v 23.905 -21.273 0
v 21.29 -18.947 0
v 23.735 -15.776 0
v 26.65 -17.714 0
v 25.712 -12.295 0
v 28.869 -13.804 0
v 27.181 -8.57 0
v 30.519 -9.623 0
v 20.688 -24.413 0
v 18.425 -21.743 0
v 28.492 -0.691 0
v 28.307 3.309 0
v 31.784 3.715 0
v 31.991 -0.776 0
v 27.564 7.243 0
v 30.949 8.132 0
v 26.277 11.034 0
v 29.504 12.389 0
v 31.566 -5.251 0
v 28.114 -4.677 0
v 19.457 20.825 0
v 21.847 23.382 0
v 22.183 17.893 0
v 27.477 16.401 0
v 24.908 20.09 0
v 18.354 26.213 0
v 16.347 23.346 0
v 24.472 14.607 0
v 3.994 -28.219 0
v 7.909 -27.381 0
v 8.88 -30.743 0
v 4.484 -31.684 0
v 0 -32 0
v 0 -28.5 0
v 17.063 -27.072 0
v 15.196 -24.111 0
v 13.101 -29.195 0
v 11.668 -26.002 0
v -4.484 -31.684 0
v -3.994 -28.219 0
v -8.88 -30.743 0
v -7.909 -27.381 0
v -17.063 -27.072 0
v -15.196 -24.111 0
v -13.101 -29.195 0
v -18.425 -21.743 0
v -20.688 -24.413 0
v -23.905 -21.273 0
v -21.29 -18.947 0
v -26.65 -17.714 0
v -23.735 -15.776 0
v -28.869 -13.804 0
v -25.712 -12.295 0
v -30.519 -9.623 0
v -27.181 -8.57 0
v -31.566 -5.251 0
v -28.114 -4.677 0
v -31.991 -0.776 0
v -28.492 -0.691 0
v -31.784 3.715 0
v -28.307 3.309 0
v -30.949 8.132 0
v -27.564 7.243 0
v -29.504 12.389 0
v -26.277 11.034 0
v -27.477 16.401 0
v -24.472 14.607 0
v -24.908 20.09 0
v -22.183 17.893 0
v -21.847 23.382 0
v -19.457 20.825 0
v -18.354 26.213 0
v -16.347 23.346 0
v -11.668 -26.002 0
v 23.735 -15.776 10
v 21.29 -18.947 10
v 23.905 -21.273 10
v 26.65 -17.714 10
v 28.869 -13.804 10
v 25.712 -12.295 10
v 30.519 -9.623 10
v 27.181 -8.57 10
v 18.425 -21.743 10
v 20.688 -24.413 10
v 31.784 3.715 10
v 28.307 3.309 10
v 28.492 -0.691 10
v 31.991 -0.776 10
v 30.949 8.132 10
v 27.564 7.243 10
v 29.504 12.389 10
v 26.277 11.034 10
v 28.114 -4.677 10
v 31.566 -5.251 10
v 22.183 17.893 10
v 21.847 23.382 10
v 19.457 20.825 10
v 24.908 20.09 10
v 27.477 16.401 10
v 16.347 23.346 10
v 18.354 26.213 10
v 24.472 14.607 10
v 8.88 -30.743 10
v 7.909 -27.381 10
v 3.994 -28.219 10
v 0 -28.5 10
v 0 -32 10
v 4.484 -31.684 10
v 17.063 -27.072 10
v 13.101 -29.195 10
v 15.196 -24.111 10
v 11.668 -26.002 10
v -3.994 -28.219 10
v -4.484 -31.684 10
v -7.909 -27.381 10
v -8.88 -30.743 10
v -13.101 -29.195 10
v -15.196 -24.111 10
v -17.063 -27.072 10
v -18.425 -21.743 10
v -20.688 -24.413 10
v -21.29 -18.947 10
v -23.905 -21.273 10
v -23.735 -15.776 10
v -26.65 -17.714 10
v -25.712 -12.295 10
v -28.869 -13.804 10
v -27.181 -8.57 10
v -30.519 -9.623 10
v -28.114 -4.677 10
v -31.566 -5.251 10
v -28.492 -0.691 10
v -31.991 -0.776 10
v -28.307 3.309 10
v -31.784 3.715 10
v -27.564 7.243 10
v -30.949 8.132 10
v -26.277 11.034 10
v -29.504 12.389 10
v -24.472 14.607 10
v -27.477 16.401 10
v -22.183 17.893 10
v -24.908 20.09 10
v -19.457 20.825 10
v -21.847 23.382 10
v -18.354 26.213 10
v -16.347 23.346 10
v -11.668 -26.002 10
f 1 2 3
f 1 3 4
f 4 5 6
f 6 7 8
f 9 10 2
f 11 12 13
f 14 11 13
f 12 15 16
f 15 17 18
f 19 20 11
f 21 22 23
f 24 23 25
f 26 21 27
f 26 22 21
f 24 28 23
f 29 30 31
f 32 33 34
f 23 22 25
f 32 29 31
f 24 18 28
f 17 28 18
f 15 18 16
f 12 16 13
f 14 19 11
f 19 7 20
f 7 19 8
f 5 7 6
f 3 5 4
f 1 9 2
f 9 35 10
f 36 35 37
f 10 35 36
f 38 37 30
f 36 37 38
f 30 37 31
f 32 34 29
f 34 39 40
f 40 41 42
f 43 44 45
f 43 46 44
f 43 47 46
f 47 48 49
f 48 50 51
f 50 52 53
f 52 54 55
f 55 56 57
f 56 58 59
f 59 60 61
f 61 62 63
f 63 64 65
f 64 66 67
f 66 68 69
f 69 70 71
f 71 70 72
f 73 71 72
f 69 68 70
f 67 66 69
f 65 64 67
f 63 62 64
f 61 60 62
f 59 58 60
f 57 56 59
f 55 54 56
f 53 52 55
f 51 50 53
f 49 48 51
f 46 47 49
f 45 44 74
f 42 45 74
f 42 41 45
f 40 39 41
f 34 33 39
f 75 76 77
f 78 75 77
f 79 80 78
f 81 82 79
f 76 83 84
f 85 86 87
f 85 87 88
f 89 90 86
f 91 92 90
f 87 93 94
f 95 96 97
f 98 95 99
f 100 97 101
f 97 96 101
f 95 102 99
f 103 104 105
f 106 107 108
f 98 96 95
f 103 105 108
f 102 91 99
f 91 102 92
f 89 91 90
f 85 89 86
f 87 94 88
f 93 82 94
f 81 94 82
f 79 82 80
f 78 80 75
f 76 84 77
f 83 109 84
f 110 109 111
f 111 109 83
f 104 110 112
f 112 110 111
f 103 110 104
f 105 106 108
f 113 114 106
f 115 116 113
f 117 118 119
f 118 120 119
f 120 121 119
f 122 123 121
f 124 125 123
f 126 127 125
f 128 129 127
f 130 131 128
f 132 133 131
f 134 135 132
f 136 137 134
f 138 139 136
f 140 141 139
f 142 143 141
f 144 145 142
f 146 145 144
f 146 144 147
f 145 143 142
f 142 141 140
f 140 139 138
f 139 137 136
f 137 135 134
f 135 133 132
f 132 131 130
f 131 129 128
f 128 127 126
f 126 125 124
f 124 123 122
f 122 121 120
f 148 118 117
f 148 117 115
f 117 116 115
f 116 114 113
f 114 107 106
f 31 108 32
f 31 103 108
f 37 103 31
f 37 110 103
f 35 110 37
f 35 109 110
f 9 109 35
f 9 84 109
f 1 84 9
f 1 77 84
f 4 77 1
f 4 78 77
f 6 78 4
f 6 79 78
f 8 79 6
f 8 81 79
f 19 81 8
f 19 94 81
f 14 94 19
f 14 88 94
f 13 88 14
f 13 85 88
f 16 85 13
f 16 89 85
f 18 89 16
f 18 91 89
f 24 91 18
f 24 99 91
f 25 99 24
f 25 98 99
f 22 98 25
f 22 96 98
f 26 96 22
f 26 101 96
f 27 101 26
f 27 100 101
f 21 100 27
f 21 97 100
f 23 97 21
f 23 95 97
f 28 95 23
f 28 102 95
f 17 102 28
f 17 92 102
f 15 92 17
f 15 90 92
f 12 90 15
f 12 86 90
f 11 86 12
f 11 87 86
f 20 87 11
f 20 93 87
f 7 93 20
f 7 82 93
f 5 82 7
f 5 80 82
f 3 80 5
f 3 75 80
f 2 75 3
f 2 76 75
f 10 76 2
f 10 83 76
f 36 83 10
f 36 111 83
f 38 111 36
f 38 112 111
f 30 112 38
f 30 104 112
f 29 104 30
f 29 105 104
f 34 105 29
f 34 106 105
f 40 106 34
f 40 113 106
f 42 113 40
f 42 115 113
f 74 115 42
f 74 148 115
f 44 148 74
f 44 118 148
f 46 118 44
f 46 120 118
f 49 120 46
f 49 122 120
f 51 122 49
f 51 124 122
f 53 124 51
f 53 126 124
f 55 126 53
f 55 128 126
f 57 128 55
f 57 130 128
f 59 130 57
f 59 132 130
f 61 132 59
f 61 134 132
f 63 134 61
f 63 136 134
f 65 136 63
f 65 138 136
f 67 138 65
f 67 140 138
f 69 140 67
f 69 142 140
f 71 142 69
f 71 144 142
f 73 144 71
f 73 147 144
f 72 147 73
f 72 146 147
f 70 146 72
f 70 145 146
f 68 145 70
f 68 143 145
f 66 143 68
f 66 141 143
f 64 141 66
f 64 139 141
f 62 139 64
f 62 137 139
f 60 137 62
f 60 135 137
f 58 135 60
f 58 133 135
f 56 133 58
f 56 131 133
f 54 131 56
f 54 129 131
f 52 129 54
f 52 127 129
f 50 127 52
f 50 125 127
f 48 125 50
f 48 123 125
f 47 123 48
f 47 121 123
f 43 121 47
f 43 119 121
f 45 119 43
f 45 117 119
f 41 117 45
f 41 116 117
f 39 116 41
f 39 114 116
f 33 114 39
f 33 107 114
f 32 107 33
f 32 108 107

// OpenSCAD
$fn = 32;

// ----------------------------------------------------------------------
// Spring clip: 64 mm outside, 3.5 mm band, 70 degree opening
// ----------------------------------------------------------------------

// --- parameters (mm) ---
outer_r = 32;             // clip outside radius
inner_r = 28.5;           // clip bore radius
band = 3.5;               // band thickness
clip_w = 10;              // clip width
opening = 70;             // opening angle

clip_profile = [[-18.354, 26.213], [-21.847, 23.382], [-24.908, 20.09], [-27.477, 16.401], [-29.504, 12.389], [-30.949, 8.132], [-31.784, 3.715], [-31.991, -0.776], [-31.566, -5.251], [-30.519, -9.623], [-28.869, -13.804], [-26.65, -17.714], [-23.905, -21.273], [-20.688, -24.413], [-17.063, -27.072], [-13.101, -29.195], [-8.88, -30.743], [-4.484, -31.684], [0, -32], [4.484, -31.684], [8.88, -30.743], [13.101, -29.195], [17.063, -27.072], [20.688, -24.413], [23.905, -21.273], [26.65, -17.714], [28.869, -13.804], [30.519, -9.623], [31.566, -5.251], [31.991, -0.776], [31.784, 3.715], [30.949, 8.132], [29.504, 12.389], [27.477, 16.401], [24.908, 20.09], [21.847, 23.382], [18.354, 26.213], [16.347, 23.346], [19.457, 20.825], [22.183, 17.893], [24.472, 14.607], [26.277, 11.034], [27.564, 7.243], [28.307, 3.309], [28.492, -0.691], [28.114, -4.677], [27.181, -8.57], [25.712, -12.295], [23.735, -15.776], [21.29, -18.947], [18.425, -21.743], [15.196, -24.111], [11.668, -26.002], [7.909, -27.381], [3.994, -28.219], [0, -28.5], [-3.994, -28.219], [-7.909, -27.381], [-11.668, -26.002], [-15.196, -24.111], [-18.425, -21.743], [-21.29, -18.947], [-23.735, -15.776], [-25.712, -12.295], [-27.181, -8.57], [-28.114, -4.677], [-28.492, -0.691], [-28.307, 3.309], [-27.564, 7.243], [-26.277, 11.034], [-24.472, 14.607], [-22.183, 17.893], [-19.457, 20.825], [-16.347, 23.346]];

difference() {
  union() {
    linear_extrude(height = clip_w) polygon(clip_profile);
  }
}
